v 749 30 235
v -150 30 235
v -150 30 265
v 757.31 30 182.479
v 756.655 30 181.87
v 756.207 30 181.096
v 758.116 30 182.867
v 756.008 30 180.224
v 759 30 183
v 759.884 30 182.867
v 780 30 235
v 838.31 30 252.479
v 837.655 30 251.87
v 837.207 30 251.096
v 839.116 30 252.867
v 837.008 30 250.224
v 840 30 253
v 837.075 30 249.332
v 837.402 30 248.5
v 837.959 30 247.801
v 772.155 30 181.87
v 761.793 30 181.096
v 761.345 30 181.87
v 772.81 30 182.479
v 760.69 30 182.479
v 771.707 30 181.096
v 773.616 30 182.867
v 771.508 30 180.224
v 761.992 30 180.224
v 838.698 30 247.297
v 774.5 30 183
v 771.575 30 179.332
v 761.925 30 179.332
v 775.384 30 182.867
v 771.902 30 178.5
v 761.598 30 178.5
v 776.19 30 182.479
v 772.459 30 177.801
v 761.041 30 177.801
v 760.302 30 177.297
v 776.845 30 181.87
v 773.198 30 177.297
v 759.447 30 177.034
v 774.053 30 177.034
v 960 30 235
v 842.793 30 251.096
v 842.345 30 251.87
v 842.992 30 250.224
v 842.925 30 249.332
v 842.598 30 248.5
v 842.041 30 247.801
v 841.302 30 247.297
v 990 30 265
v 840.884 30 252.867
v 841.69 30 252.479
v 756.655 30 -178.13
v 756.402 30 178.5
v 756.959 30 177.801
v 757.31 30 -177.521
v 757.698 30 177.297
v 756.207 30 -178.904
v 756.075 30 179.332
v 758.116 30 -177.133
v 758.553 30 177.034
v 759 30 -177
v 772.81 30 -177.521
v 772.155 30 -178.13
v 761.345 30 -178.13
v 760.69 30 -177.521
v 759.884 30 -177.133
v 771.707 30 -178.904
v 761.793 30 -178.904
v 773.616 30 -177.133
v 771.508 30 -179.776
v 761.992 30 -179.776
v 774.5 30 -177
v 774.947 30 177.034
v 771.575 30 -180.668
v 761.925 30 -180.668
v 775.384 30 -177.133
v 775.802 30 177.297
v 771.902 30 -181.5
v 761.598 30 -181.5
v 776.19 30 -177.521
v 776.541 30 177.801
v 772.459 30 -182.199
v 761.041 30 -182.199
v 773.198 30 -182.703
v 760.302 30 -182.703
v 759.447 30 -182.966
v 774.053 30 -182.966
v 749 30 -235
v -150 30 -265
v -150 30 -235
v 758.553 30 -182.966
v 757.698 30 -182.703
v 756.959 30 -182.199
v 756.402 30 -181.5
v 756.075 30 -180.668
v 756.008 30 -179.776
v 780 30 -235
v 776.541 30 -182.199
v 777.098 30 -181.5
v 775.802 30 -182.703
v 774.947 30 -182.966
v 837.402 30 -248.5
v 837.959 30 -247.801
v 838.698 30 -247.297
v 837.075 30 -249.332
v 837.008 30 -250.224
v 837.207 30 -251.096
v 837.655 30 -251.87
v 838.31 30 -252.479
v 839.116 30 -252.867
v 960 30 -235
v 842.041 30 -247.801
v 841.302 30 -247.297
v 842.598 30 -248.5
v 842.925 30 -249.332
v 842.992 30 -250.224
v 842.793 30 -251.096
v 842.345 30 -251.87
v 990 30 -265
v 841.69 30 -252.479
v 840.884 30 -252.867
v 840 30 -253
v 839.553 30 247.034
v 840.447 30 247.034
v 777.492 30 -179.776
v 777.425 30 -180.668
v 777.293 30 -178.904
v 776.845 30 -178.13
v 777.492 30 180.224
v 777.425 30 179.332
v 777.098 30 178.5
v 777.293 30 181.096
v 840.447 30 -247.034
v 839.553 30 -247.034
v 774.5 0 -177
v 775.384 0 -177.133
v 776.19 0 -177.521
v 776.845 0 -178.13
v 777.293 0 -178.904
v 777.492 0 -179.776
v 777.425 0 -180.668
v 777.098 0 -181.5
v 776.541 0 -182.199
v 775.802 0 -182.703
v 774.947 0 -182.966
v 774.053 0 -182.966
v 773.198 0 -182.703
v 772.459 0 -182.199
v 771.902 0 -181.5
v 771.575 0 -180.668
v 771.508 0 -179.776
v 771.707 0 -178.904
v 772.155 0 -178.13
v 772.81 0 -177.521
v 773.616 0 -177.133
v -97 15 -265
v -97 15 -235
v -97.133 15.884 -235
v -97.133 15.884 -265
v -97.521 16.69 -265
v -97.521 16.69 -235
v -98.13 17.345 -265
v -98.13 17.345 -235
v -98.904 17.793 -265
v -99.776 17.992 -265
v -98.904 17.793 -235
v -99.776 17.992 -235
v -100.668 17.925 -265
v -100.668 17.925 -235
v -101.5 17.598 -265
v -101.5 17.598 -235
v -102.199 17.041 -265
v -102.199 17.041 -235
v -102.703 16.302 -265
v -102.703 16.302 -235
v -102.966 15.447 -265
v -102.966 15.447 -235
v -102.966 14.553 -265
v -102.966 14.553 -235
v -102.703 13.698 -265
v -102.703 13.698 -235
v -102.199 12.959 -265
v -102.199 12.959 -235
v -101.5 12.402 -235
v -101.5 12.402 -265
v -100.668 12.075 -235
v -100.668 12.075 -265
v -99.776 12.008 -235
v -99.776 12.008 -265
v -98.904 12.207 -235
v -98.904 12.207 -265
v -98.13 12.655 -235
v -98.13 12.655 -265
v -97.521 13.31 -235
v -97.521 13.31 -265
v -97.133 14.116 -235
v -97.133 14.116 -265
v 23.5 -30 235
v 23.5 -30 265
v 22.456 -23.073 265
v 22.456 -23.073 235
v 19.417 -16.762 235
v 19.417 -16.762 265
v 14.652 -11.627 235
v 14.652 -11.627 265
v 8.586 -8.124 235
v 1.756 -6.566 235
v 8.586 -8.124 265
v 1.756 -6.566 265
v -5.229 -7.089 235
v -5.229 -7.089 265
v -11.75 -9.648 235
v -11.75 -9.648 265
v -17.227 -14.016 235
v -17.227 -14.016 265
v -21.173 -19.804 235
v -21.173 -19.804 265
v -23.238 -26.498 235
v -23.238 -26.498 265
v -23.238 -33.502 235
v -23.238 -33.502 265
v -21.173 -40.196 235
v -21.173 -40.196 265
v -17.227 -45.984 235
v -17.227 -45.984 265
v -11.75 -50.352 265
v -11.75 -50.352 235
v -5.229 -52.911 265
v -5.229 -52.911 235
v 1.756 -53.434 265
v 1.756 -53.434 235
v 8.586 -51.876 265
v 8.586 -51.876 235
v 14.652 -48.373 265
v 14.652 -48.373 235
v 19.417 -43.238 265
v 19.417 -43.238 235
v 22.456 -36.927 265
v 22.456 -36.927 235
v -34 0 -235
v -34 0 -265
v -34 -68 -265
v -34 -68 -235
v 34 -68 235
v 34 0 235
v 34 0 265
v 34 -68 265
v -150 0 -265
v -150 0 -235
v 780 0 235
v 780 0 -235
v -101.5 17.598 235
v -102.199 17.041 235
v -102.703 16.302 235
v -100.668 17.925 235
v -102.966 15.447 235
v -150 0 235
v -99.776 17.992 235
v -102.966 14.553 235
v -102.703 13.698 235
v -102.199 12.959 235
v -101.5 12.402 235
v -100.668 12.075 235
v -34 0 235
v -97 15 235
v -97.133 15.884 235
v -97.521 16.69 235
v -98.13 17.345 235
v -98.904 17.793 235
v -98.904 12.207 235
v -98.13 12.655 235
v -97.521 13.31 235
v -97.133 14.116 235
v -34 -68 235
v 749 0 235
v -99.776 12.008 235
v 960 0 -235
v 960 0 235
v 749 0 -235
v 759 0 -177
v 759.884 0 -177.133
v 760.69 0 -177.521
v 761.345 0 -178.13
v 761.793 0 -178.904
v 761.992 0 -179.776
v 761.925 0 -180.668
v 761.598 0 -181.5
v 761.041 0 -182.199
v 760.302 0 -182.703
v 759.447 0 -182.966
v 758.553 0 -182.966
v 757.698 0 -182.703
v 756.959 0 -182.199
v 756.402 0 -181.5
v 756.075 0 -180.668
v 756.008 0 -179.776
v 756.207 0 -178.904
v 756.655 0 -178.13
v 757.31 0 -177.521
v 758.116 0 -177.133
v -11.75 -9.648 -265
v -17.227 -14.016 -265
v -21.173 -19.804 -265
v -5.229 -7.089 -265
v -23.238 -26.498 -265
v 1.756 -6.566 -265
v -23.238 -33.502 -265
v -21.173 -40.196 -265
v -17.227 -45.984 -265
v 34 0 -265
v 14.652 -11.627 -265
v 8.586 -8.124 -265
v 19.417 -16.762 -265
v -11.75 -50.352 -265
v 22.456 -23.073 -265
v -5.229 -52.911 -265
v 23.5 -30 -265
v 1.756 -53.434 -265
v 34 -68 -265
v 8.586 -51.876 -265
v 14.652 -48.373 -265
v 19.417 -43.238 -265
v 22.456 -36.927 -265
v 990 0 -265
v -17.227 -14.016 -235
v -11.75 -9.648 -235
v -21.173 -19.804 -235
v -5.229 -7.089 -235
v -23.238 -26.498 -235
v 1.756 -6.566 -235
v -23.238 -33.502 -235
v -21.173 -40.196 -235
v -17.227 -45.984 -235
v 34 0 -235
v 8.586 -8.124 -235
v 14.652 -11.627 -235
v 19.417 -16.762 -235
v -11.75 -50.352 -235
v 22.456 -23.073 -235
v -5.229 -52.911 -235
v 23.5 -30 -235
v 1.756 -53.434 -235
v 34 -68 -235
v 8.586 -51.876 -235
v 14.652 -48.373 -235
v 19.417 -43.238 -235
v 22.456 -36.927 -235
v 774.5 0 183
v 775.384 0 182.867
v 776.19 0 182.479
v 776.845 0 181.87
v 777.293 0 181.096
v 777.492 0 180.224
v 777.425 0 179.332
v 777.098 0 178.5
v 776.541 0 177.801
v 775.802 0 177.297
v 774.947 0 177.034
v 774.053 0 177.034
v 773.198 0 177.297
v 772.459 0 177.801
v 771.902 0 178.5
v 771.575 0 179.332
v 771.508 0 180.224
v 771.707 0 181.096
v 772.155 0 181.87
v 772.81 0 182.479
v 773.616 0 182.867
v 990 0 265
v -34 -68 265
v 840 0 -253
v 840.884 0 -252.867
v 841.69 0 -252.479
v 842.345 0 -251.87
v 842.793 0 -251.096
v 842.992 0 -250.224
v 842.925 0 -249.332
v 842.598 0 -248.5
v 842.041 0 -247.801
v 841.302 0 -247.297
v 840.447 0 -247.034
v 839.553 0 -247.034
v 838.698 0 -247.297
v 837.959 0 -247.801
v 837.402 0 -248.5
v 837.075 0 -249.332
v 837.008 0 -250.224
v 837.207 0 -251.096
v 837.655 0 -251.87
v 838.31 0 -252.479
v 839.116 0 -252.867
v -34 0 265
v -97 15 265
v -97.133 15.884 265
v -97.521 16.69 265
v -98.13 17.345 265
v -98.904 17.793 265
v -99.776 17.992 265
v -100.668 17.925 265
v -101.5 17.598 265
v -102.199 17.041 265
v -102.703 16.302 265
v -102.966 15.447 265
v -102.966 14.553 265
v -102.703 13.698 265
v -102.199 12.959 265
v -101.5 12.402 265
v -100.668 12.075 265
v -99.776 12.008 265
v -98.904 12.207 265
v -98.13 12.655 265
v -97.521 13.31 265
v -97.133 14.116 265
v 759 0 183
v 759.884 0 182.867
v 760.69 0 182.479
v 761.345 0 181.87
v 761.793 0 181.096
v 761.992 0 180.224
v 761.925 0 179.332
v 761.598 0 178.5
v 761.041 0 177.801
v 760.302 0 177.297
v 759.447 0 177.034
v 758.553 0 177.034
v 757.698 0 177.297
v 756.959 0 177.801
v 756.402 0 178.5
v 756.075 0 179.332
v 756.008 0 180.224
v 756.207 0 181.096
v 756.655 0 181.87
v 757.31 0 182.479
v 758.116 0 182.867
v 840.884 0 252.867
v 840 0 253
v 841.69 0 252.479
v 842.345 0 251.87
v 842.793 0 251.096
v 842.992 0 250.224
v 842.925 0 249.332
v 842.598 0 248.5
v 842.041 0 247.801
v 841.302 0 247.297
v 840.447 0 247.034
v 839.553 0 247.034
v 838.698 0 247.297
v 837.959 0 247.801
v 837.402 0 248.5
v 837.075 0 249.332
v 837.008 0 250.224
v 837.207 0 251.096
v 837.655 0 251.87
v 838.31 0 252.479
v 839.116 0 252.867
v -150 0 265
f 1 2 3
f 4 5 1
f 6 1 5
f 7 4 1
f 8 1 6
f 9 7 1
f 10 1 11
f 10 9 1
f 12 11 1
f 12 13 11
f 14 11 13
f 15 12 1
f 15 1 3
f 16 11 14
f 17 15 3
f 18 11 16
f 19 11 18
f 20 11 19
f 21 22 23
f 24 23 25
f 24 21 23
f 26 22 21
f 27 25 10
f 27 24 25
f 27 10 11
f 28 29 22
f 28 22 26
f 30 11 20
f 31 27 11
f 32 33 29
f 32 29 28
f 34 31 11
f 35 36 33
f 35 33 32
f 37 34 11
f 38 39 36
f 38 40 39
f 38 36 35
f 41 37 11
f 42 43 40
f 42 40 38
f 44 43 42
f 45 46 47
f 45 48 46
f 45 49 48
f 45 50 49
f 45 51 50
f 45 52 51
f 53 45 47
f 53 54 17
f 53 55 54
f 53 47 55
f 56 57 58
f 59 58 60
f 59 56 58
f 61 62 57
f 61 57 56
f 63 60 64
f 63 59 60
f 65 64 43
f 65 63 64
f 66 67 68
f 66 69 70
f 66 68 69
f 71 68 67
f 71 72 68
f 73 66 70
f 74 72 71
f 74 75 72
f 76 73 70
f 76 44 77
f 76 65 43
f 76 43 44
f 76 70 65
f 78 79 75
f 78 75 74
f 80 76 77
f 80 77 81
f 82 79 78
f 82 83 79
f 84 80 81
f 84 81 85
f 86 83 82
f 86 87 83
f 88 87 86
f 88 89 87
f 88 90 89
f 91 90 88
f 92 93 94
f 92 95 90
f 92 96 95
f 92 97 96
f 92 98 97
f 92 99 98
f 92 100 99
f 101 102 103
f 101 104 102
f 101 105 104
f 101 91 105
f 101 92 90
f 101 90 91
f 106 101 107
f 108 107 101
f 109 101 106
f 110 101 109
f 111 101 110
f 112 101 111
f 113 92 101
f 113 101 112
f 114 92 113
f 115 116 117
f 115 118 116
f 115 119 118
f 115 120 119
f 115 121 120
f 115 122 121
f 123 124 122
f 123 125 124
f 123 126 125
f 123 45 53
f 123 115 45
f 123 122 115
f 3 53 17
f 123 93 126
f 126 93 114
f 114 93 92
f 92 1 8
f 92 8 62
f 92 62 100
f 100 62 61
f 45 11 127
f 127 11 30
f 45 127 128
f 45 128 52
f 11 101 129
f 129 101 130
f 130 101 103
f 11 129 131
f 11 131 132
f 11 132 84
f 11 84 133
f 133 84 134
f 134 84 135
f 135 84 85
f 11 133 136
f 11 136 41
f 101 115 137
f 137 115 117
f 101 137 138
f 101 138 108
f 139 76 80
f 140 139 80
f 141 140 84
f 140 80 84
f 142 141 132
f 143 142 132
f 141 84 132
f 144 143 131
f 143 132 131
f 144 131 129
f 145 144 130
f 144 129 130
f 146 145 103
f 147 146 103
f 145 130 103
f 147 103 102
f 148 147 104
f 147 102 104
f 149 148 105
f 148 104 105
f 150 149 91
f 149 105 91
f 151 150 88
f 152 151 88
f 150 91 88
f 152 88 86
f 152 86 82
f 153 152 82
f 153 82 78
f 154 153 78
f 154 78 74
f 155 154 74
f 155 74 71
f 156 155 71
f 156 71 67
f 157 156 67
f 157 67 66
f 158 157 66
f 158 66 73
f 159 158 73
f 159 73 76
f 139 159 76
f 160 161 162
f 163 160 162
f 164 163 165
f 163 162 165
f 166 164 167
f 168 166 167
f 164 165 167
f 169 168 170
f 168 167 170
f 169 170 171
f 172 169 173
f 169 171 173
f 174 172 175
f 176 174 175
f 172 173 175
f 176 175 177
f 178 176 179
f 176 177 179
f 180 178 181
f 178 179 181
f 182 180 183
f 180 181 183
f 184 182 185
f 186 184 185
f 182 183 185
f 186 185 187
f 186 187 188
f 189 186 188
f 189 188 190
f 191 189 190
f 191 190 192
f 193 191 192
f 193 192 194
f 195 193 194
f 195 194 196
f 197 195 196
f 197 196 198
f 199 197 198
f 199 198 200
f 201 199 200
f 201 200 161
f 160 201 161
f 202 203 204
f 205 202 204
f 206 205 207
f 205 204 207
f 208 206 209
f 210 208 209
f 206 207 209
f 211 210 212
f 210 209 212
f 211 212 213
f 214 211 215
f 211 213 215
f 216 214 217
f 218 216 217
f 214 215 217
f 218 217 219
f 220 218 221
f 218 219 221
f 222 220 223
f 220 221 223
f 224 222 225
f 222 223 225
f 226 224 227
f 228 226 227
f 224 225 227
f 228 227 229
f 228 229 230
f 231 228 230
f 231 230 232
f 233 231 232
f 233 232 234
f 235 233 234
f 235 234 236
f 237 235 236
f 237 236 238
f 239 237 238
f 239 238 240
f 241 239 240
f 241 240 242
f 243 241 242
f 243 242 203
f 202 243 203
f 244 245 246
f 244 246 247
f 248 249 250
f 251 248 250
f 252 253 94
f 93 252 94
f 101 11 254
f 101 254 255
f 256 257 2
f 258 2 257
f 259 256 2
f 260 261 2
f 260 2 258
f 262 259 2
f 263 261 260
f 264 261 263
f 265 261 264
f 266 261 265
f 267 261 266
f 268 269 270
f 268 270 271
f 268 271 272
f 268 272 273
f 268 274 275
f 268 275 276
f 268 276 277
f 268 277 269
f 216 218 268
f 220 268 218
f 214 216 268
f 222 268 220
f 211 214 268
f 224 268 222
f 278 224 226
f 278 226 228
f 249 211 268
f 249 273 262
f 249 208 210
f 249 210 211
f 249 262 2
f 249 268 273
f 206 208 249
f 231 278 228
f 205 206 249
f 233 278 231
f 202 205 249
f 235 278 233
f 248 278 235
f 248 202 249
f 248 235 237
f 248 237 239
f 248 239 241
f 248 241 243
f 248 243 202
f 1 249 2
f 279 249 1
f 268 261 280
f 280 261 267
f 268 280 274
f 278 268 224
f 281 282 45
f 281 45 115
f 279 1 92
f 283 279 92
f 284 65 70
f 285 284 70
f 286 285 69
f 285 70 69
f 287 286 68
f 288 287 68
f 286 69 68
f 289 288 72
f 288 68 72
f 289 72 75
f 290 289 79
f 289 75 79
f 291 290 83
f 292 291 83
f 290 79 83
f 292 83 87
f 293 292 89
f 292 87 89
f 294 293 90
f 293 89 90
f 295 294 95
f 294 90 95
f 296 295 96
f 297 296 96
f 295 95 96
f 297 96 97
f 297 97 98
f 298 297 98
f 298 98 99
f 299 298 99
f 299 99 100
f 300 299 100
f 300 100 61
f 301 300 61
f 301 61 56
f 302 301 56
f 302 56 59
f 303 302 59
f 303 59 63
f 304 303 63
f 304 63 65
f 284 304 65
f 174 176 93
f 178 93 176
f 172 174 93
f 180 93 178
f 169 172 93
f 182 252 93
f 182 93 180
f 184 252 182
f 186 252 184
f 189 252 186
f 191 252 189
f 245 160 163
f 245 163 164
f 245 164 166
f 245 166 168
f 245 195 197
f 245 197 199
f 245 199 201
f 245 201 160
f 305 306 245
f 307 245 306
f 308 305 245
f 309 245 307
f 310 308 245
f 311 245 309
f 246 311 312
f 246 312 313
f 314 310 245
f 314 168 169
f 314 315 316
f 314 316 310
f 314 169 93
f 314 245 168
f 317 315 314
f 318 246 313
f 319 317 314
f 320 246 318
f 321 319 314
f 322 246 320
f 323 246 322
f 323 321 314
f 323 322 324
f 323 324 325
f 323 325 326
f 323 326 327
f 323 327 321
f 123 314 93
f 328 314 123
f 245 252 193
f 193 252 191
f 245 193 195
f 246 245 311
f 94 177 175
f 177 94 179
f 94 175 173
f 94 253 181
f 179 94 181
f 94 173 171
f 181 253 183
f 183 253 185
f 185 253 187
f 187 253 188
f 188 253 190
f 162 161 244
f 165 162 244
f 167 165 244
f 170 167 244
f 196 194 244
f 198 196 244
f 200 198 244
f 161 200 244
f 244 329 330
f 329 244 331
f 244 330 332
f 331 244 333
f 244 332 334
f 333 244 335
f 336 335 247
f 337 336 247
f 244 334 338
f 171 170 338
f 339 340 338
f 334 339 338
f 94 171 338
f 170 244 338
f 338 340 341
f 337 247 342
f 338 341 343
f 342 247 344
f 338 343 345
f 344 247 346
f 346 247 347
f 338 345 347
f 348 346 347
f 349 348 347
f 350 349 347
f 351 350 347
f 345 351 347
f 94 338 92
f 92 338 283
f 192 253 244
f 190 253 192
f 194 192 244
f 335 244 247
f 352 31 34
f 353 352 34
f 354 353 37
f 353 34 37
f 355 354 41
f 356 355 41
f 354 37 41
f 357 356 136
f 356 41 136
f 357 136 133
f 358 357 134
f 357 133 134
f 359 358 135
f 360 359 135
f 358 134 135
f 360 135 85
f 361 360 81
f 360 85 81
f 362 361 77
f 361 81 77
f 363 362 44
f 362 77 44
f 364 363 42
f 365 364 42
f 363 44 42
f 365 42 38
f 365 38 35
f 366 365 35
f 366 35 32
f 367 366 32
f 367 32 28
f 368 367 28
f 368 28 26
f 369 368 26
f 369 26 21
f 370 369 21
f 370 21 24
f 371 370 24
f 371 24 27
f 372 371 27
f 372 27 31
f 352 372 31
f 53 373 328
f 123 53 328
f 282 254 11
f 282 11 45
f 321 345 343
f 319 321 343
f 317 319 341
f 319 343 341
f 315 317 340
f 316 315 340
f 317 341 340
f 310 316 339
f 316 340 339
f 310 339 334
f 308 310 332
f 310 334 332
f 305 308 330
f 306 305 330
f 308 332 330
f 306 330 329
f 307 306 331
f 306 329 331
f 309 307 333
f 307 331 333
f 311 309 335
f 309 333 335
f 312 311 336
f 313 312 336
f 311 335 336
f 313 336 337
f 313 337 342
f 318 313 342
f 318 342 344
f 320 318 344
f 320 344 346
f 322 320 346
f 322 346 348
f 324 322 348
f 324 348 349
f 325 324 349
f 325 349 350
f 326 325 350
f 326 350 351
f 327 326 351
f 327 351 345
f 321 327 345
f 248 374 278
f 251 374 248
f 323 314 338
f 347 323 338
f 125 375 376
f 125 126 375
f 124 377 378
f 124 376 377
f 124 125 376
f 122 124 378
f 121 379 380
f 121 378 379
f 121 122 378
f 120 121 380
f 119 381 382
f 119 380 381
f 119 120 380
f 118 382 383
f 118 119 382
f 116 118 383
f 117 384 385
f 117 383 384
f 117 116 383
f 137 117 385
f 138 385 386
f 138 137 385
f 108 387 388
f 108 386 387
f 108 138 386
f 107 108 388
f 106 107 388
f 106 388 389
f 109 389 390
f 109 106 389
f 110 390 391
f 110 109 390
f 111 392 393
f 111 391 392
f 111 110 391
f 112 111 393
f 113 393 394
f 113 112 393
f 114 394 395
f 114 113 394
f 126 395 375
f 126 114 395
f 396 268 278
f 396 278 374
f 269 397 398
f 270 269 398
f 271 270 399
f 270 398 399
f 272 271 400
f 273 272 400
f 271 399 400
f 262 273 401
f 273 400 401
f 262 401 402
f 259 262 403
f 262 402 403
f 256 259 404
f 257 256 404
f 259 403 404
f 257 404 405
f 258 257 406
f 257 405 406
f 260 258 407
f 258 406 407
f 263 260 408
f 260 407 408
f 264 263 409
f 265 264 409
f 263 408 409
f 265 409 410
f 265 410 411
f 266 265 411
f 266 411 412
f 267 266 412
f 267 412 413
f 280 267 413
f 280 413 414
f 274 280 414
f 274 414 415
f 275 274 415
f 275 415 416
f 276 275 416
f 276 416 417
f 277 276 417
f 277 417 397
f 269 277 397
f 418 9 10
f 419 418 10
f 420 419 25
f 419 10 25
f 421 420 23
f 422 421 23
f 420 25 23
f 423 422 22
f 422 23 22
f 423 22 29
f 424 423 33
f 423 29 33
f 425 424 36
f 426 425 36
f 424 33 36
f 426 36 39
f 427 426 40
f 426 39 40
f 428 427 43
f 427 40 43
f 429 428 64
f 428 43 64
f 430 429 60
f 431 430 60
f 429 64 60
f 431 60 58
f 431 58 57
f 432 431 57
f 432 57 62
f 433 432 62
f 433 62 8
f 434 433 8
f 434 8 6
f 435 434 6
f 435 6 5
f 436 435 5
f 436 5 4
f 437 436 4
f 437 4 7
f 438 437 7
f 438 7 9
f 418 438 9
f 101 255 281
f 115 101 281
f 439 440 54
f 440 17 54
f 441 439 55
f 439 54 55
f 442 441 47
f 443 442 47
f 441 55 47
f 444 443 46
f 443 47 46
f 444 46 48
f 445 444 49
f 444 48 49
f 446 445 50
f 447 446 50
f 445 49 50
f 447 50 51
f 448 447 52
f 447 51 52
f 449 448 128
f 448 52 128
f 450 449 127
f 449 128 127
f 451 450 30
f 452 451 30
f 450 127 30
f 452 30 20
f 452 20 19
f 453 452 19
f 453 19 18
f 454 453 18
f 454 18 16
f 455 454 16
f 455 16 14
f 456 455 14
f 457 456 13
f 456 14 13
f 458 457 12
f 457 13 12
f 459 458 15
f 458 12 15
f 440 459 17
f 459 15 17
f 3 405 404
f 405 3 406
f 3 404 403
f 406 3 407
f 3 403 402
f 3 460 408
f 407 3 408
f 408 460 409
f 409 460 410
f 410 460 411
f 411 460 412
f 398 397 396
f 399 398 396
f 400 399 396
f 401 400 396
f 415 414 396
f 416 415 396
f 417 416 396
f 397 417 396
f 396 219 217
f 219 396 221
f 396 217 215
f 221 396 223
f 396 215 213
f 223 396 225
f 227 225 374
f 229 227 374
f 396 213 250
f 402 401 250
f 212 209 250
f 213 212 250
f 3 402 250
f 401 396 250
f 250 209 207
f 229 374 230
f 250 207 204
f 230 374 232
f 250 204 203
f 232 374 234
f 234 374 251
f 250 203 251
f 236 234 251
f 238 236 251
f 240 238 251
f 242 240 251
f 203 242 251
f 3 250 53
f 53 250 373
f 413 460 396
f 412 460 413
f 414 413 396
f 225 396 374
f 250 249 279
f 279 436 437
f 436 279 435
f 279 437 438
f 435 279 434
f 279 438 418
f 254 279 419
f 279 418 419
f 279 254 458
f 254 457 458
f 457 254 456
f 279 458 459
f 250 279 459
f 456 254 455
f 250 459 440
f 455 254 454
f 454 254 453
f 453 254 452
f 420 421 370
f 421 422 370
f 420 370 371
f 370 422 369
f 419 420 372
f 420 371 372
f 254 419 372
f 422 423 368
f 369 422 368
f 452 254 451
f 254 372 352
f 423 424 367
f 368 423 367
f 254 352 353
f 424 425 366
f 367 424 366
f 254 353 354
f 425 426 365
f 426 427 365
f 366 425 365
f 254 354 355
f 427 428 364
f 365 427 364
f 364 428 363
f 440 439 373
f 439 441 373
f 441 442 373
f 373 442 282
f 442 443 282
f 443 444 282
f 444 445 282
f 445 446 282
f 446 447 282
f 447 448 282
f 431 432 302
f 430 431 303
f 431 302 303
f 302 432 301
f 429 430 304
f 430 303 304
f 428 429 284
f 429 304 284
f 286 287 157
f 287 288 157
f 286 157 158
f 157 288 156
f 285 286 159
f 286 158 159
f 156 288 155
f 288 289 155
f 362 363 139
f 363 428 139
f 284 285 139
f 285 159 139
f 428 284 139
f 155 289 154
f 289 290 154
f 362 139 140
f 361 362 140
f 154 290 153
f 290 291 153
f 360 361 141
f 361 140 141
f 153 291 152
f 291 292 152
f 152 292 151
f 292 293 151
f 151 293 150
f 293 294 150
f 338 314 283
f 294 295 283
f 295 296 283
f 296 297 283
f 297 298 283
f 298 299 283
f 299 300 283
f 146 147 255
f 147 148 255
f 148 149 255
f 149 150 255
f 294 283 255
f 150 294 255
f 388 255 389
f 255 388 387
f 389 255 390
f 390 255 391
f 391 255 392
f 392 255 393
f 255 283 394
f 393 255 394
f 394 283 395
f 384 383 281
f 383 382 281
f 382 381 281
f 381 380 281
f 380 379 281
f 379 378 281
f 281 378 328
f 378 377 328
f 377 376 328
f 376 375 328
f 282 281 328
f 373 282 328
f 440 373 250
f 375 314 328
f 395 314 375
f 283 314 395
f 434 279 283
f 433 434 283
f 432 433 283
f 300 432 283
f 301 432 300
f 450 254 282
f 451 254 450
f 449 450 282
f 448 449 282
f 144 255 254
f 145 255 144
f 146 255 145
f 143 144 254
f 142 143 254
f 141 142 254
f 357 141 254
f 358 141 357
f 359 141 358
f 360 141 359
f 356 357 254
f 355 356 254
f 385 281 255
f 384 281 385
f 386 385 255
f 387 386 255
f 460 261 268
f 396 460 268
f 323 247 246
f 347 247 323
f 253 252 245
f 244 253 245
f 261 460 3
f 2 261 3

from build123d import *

# Parameters (mm, degrees)
SKETCH_1_W          = 1980
SKETCH_1_H          = 530
SKETCH_1_W_2        = 1920
SKETCH_1_H_2        = 470
EXTRUDE_1_DEPTH     = 30
SKETCH_2_W          = 68
SKETCH_2_H          = 30
EXTRUDE_2_DEPTH     = 68
SKETCH_3_R          = 23.5
CUT_EXTRUDE_1_DEPTH = 1125.999555555
SKETCH_4_W          = 31
SKETCH_4_H          = 470
EXTRUDE_3_DEPTH     = 30
SKETCH_5_R          = 3
CUT_EXTRUDE_2_DEPTH = 1030.528532873
SKETCH_6_R          = 3
CUT_EXTRUDE_3_DEPTH = 1030.528532873
SKETCH_7_W          = 883.399544852
SKETCH_7_H          = 30
CUT_EXTRUDE_4_DEPTH = 1125.999555555
SKETCH_8_R          = 3
CUT_EXTRUDE_5_DEPTH = 1125.999555555


with BuildPart() as part:
    # 草图1 → 凸台-拉伸1 (new body)
    with BuildSketch(Plane(origin=(0, 0, 0), x_dir=(1, 0, 0), z_dir=(0, 1, 0))):
        Rectangle(SKETCH_1_W, SKETCH_1_H)
        Rectangle(SKETCH_1_W_2, SKETCH_1_H_2, mode=Mode.SUBTRACT)
    extrude(amount=EXTRUDE_1_DEPTH)

    # 草图2 → 凸台-拉伸2 (add)
    with BuildSketch(Plane.XZ):
        with Locations((0, 250)):
            Rectangle(SKETCH_2_W, SKETCH_2_H)
        with Locations((0, -250)):
            Rectangle(SKETCH_2_W, SKETCH_2_H)
    extrude(amount=EXTRUDE_2_DEPTH)

    # 草图3 → 切除-拉伸1 (cut, through all)
    with BuildSketch(Plane.XY.offset(265)):
        with Locations((0, -30)):
            Circle(SKETCH_3_R)
    extrude(amount=-CUT_EXTRUDE_1_DEPTH, mode=Mode.SUBTRACT)

    # 草图4 → 凸台-拉伸3 (add)
    with BuildSketch(Plane(origin=(0, 30, 0), x_dir=(1, 0, 0), z_dir=(0, 1, 0))):
        with Locations((764.5, 0)):
            Rectangle(SKETCH_4_W, SKETCH_4_H)
    extrude(amount=-EXTRUDE_3_DEPTH)

    # 草图5 → 切除-拉伸2 (cut, through all)
    with BuildSketch(Plane(origin=(0, 30, 0), x_dir=(1, 0, 0), z_dir=(0, 1, 0))):
        with Locations(Location((759, 180, 0), (0, 0, 270))):
            Circle(SKETCH_5_R)
        with Locations(Location((774.5, 180, 0), (0, 0, 270))):
            Circle(SKETCH_5_R)
        with Locations(Location((759, -180, 0), (0, 0, 270))):
            Circle(SKETCH_5_R)
        with Locations(Location((774.5, -180, 0), (0, 0, 270))):
            Circle(SKETCH_5_R)
    extrude(amount=-CUT_EXTRUDE_2_DEPTH, mode=Mode.SUBTRACT)

    # 草图6 → 切除-拉伸3 (cut, symmetric)
    with BuildSketch(Plane(origin=(0, 30, 0), x_dir=(1, 0, 0), z_dir=(0, 1, 0))):
        with Locations(Location((840, -250, 0), (0, 0, 270))):
            Circle(SKETCH_6_R)
    cut_extrude_3 = extrude(amount=CUT_EXTRUDE_3_DEPTH, both=True, mode=Mode.SUBTRACT)

    # 镜向1: 切除-拉伸3 across plane
    add(cut_extrude_3.mirror(Plane.XY), mode=Mode.SUBTRACT)

    # 草图7 → 切除-拉伸4 (cut, through all)
    with BuildSketch(Plane.XY.offset(265)):
        with Locations((-591.699772426, 15)):
            Rectangle(SKETCH_7_W, SKETCH_7_H)
    extrude(amount=-CUT_EXTRUDE_4_DEPTH, mode=Mode.SUBTRACT)

    # 草图8 → 切除-拉伸5 (cut, through all)
    with BuildSketch(Plane.XY.offset(265)):
        with Locations((-100, 15)):
            Circle(SKETCH_8_R)
    extrude(amount=-CUT_EXTRUDE_5_DEPTH, mode=Mode.SUBTRACT)


solid = part.part
